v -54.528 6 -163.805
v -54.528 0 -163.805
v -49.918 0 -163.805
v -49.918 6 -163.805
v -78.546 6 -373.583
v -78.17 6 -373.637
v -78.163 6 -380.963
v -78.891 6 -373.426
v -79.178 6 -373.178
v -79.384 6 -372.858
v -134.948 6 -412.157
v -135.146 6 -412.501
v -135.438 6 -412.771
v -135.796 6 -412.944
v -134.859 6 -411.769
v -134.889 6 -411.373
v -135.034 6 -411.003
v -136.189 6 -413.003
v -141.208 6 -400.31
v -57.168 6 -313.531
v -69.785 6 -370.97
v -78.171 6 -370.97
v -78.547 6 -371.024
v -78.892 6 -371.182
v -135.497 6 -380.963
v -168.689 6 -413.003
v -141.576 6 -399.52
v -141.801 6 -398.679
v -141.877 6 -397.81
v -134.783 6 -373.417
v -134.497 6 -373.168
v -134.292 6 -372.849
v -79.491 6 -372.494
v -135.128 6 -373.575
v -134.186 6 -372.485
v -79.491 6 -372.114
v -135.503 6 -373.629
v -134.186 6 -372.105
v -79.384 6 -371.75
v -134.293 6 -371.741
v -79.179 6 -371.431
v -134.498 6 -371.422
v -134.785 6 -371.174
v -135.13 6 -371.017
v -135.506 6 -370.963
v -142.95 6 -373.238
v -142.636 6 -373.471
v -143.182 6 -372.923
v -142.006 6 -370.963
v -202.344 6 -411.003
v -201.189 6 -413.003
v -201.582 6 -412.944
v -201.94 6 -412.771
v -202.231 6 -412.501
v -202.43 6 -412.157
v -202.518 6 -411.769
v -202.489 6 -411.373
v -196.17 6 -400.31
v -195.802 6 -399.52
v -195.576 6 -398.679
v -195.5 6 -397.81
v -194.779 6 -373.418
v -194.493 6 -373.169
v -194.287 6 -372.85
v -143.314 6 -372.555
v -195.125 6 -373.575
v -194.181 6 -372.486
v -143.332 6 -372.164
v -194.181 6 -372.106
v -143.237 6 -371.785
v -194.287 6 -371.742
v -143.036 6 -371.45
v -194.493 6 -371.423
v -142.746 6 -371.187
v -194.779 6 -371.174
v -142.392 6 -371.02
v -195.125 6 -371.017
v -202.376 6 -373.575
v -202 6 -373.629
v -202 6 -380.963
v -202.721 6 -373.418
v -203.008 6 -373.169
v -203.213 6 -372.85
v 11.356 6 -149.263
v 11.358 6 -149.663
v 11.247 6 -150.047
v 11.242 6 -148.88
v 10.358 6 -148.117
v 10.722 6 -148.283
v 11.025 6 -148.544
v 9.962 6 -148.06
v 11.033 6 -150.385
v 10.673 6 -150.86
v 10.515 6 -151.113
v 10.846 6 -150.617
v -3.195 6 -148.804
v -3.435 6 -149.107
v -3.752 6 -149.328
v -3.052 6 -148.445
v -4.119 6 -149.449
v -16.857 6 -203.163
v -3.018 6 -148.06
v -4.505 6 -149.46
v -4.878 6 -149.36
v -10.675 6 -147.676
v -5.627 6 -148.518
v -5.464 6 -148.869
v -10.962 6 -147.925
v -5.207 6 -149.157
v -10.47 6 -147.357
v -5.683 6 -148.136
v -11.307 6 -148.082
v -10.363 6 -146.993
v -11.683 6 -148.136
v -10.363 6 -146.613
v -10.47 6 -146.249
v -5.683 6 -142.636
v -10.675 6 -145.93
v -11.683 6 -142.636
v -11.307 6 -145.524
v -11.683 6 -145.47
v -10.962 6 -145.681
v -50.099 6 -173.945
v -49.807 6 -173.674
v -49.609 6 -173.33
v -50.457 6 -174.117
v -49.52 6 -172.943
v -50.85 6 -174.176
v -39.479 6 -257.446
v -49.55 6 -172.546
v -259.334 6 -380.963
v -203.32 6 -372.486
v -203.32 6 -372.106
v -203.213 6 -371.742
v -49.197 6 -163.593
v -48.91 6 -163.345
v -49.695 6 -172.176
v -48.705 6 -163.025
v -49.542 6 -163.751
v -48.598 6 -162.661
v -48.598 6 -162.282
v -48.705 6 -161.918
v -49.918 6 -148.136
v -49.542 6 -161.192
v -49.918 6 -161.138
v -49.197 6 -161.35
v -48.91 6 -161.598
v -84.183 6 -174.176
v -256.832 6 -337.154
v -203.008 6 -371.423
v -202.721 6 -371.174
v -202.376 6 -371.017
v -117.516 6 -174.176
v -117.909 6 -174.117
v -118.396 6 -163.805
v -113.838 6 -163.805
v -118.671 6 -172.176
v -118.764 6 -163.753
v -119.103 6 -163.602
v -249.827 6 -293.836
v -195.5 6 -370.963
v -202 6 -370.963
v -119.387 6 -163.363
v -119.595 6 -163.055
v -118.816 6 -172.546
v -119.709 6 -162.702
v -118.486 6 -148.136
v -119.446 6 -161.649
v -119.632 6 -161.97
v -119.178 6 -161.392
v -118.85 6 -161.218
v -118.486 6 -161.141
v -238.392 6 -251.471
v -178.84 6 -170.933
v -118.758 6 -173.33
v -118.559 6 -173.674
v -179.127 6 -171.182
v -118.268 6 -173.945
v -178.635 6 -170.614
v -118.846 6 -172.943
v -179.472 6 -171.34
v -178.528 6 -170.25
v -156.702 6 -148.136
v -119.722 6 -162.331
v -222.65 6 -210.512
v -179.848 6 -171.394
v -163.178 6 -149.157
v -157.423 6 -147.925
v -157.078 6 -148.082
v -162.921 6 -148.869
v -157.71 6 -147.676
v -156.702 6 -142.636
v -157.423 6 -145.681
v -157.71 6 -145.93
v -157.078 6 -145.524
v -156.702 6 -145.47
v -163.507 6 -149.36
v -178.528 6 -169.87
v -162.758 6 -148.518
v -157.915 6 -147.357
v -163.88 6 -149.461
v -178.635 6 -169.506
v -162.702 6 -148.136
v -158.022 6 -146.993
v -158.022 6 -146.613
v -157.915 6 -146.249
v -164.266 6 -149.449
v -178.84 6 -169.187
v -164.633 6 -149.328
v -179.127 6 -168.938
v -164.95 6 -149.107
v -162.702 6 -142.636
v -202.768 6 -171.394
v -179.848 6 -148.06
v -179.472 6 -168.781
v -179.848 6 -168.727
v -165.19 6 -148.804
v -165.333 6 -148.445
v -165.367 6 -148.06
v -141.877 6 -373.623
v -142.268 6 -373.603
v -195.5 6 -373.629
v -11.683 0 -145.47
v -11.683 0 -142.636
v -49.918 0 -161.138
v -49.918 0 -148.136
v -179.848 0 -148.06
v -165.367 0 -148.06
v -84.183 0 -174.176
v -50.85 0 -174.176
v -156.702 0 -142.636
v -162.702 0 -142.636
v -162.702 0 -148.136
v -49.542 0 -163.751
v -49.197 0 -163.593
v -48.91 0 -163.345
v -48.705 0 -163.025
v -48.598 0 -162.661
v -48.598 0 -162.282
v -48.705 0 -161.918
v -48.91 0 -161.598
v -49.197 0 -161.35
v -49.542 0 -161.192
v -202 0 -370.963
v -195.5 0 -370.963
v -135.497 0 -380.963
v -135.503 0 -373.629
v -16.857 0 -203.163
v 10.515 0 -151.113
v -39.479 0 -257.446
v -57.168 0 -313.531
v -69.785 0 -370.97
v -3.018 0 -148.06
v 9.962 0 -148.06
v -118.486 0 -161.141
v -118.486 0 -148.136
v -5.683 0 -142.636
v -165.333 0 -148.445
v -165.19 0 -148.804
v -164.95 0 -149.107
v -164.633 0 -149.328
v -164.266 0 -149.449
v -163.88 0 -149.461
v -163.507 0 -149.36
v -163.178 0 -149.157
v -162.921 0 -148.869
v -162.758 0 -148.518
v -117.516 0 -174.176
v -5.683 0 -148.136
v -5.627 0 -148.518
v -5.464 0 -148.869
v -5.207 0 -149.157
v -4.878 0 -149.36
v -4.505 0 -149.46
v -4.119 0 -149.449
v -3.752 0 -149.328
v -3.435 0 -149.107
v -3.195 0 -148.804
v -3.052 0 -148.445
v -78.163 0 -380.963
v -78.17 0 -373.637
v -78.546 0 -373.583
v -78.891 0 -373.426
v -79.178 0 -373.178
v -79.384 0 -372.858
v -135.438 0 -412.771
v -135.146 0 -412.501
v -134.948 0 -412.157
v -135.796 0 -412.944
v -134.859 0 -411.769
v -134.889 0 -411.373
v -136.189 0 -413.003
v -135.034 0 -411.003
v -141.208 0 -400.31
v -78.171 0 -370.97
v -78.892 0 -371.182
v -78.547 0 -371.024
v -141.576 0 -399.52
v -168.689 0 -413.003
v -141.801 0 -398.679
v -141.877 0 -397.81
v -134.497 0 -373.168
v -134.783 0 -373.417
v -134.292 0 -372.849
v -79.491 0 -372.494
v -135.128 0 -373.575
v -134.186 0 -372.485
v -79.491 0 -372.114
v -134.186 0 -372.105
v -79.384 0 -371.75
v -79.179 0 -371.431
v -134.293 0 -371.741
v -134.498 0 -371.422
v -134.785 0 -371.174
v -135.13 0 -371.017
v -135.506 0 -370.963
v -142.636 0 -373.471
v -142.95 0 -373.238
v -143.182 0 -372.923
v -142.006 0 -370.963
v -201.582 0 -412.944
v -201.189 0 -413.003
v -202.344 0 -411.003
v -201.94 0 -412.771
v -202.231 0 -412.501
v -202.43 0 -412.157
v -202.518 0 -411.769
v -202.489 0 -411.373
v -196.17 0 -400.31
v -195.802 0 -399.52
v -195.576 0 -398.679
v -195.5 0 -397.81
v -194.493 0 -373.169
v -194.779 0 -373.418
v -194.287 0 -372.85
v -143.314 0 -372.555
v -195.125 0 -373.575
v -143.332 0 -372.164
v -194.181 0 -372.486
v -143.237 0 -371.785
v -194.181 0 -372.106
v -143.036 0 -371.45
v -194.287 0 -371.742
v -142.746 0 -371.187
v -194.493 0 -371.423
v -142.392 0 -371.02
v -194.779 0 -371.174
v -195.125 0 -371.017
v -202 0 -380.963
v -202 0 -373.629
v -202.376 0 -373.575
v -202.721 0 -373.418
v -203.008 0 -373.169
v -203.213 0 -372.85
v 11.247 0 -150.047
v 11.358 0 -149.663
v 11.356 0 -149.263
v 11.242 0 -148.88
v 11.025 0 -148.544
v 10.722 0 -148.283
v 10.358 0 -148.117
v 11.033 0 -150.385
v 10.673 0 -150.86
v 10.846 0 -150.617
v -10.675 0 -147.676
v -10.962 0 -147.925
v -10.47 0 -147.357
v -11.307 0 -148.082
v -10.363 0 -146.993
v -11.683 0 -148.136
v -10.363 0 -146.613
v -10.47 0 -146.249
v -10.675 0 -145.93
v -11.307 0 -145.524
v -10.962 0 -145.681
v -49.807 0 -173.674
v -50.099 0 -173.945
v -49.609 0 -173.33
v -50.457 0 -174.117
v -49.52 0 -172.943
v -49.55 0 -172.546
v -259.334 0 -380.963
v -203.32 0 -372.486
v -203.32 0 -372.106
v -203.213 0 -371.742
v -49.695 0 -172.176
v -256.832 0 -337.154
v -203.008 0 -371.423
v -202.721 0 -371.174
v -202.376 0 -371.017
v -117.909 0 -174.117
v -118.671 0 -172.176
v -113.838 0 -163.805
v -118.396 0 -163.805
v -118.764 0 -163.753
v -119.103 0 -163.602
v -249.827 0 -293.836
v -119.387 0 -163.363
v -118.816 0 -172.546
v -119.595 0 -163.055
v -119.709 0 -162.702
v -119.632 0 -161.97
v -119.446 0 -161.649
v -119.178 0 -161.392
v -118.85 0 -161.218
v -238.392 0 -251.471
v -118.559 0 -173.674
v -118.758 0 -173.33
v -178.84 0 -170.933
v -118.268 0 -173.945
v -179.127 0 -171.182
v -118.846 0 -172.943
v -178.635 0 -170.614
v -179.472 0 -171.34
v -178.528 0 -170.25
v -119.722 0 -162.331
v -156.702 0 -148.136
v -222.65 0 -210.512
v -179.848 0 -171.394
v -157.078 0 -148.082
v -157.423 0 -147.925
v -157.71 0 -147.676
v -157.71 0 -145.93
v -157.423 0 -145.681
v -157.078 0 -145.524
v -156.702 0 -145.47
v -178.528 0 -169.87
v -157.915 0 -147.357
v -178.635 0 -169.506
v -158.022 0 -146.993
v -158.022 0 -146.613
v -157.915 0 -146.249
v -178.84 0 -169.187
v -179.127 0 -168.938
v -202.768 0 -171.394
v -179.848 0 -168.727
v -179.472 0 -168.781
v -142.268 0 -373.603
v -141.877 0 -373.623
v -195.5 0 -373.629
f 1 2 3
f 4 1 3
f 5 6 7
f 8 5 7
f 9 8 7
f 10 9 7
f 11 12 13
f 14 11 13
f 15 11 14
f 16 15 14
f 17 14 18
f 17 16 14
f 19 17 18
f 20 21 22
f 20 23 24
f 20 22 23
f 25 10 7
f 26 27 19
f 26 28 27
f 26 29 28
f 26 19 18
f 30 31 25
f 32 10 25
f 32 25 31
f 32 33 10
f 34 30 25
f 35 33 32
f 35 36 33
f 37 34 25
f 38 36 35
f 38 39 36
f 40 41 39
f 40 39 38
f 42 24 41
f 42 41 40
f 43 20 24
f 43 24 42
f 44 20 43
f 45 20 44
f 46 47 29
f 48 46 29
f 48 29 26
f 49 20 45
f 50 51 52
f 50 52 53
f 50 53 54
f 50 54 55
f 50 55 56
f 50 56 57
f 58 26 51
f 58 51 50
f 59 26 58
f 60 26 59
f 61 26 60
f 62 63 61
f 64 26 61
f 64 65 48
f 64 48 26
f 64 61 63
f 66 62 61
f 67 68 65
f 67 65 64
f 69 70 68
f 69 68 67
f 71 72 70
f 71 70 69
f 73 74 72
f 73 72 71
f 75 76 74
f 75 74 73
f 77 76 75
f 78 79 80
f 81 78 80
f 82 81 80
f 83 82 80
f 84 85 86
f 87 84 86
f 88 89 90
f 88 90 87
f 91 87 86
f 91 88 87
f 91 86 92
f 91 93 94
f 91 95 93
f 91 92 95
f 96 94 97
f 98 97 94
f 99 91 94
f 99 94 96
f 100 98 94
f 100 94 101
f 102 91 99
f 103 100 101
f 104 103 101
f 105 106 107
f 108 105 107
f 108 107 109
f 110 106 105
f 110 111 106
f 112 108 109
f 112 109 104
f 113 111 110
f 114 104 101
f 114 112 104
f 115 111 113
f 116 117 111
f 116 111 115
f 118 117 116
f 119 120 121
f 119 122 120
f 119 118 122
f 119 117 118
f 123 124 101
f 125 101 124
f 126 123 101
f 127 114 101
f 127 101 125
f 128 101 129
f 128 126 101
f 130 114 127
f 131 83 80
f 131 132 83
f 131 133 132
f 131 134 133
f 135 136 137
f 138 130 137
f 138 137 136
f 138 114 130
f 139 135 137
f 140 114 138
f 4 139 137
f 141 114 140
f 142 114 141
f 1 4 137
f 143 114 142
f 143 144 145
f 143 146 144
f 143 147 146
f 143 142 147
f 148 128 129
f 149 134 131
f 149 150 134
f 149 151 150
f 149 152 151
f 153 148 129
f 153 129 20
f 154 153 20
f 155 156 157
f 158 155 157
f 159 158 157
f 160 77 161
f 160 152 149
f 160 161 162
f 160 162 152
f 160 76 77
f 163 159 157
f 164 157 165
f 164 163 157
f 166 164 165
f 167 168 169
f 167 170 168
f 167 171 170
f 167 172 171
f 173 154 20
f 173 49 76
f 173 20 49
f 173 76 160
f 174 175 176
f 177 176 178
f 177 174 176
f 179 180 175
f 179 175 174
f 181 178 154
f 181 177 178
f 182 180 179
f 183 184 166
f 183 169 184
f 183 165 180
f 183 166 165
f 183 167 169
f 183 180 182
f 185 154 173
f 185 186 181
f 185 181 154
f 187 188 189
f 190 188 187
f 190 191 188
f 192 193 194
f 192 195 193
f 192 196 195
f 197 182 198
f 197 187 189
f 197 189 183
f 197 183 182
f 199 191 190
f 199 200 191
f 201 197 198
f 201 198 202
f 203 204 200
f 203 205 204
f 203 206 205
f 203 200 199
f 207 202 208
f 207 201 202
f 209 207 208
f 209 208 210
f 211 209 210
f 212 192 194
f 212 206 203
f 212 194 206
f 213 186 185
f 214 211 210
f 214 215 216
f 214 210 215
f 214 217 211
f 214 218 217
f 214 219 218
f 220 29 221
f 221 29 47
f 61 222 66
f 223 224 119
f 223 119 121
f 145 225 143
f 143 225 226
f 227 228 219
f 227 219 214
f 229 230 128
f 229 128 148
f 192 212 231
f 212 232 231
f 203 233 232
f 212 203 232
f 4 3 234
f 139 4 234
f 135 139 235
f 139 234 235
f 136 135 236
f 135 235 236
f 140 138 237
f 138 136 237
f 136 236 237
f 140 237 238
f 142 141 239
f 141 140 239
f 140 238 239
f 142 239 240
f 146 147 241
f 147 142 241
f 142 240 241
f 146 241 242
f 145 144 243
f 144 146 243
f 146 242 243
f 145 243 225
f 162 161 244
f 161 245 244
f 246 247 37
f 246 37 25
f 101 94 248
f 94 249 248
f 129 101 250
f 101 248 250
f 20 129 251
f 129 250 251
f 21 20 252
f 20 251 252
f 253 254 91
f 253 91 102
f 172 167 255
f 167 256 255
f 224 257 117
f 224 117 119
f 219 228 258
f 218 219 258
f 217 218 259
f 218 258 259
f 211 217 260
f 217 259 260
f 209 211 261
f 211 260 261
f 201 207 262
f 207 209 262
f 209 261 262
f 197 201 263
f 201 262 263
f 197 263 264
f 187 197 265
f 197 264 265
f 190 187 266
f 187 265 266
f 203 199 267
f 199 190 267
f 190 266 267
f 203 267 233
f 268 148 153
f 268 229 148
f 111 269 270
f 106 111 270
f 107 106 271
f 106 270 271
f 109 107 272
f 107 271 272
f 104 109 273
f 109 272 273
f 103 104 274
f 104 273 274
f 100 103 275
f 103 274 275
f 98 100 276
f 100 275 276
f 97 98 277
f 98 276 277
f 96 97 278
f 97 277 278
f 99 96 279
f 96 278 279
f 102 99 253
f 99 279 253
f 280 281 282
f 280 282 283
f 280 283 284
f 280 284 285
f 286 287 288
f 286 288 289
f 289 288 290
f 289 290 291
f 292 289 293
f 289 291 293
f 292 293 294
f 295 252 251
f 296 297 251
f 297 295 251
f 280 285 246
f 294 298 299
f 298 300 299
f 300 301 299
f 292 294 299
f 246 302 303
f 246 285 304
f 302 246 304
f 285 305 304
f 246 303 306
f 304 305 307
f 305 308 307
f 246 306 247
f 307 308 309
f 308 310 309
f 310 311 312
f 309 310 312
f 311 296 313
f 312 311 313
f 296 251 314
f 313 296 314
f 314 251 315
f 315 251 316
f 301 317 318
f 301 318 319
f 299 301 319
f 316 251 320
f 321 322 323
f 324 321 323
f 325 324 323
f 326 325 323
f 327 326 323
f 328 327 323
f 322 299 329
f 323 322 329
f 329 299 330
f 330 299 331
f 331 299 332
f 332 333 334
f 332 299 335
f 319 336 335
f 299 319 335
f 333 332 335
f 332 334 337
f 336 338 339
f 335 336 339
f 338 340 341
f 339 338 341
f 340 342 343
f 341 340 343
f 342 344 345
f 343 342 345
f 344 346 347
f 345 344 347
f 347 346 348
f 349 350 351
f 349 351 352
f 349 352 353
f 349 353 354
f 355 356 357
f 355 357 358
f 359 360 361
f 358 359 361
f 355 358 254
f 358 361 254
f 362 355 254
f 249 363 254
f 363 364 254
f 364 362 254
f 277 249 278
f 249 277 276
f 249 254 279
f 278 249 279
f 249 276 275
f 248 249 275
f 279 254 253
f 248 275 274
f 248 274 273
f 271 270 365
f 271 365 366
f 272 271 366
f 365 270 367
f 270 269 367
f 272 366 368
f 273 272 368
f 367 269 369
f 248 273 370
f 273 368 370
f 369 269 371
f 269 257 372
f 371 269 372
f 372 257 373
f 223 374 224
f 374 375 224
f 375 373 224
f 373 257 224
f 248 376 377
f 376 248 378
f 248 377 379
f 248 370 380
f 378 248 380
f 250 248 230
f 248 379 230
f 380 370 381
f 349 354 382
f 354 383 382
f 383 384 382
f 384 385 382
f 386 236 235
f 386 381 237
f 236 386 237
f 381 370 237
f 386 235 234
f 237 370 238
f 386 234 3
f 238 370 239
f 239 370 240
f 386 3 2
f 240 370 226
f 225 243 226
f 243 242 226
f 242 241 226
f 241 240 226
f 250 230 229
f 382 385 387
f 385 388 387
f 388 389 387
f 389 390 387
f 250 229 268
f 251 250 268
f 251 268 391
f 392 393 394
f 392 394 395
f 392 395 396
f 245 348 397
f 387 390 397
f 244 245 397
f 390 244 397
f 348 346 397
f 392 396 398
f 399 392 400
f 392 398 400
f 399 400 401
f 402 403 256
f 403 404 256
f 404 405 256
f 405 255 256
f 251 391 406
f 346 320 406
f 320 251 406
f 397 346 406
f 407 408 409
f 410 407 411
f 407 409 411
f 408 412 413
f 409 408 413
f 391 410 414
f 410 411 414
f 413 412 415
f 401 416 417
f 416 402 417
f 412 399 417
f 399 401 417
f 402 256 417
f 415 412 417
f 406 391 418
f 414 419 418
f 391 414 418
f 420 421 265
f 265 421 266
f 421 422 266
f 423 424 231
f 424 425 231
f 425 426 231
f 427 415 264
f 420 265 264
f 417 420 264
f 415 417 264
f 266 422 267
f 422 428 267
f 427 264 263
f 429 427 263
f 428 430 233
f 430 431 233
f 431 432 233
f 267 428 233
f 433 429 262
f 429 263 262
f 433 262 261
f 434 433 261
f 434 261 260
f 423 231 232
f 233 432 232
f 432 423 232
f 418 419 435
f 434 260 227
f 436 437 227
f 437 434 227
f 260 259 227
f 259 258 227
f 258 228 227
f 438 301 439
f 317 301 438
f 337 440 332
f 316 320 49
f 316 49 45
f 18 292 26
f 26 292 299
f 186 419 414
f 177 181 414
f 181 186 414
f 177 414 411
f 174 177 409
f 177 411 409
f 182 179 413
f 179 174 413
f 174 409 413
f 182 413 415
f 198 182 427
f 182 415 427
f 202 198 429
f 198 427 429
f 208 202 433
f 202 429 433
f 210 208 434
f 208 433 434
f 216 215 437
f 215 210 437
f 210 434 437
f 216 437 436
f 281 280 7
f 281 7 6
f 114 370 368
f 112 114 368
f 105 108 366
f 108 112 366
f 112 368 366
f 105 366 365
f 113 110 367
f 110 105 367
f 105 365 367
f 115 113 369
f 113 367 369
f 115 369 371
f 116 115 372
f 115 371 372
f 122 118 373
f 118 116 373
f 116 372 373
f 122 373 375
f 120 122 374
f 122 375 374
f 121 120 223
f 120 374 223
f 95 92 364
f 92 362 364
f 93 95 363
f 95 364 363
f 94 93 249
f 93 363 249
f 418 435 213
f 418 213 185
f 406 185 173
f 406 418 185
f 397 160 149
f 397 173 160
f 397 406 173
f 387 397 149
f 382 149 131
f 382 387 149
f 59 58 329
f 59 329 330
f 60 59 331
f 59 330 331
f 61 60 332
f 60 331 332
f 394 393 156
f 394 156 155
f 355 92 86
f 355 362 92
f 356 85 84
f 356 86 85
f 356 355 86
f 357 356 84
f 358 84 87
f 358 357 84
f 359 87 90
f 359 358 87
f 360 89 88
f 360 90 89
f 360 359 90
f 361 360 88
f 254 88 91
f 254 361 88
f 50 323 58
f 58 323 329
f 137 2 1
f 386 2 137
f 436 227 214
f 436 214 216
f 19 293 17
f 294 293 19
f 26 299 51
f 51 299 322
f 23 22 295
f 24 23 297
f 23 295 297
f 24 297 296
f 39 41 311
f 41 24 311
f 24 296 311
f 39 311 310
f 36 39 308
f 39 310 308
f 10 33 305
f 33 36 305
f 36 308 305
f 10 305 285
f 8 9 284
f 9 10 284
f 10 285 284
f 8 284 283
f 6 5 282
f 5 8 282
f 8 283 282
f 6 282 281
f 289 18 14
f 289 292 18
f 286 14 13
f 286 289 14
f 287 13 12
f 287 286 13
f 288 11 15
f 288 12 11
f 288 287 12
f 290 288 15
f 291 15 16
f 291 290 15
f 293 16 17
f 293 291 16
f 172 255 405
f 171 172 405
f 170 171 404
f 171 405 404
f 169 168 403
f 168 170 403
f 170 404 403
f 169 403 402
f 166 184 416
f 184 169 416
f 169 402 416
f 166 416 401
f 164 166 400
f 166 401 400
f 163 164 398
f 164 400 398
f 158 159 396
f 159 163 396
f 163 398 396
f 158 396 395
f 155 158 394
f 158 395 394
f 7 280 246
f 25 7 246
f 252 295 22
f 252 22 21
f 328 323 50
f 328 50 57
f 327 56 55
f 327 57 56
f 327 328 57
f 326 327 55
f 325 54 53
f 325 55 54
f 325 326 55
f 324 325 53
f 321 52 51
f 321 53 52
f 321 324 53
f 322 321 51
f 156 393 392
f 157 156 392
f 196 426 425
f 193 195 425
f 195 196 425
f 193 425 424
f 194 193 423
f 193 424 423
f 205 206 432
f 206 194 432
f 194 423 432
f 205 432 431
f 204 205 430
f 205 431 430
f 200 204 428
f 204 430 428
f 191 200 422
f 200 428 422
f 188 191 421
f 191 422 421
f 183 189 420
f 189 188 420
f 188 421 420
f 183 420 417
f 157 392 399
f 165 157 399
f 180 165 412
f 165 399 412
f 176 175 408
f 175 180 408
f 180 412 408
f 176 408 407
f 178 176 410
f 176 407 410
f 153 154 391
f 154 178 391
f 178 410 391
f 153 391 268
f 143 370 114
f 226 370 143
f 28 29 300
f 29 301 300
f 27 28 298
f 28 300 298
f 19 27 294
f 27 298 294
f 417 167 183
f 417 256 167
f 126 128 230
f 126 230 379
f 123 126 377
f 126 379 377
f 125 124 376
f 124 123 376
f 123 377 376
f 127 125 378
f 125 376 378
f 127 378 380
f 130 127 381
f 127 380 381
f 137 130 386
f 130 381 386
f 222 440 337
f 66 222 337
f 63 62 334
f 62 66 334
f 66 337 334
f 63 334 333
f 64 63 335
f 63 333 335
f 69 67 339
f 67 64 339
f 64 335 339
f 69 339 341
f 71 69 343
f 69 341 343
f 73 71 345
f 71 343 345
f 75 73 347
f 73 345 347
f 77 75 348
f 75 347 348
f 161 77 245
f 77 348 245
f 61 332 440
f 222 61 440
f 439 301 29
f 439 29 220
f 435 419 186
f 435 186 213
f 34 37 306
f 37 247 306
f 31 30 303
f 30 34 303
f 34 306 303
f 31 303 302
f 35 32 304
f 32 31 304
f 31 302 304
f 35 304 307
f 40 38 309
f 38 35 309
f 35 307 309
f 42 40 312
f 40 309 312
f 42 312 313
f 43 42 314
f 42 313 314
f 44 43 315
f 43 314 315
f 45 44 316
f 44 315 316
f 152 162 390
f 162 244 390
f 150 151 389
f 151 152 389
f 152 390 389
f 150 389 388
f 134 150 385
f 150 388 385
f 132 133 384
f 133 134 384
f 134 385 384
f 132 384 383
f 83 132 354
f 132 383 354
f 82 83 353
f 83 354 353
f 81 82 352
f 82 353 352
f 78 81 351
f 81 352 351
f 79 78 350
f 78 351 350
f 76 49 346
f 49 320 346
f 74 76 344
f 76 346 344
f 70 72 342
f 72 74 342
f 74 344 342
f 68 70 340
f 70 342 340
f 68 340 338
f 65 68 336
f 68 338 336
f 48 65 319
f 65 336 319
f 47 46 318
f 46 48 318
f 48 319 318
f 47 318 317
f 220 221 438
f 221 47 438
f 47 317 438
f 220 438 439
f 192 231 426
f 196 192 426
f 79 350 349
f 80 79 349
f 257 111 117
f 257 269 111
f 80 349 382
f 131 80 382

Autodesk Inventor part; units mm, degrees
ref_plane "YZ Plane" through (0, 0, 0) normal (1, 0, 0) x (0, 1, 0)
ref_plane "XZ Plane" through (0, 0, 0) normal (0, 1, 0) x (-1, 0, 0)
ref_plane "XY Plane" through (0, 0, 0) normal (0, 0, 1) x (1, 0, 0)
sketch "Sketch1" plane through (0, 0, 0) normal (0, 1, 0) x (-1, 0, 0)
  line L0 (54.5284, -163.8048) -> (49.6951, -172.1764)
  arc A0 (49.6951, -172.1764) -> (50.8498, -174.1764) centre (50.8498, -172.843) ccw
  line L1 (50.8498, -174.1764) -> (117.5164, -174.1764)
  line L2 (113.8378, -163.8048) -> (118.6711, -172.1764)
  arc A1 (117.5164, -174.1764) -> (118.6711, -172.1764) centre (117.5164, -172.843) ccw
  arc A2 (259.3338, -380.9628) -> (202.7682, -171.3935) centre (-165.66, -383.2559) ccw
  line L3 (113.8378, -163.8048) -> (118.3961, -163.8048)
  arc A3 (118.3961, -163.8048) -> (118.4865, -161.1412) centre (118.3961, -162.4715) ccw
  line L4 (54.5284, -163.8048) -> (49.9178, -163.8048)
  arc A4 (49.9178, -161.1381) -> (49.9178, -163.8048) centre (49.9178, -162.4715) ccw
  line L5 (5.6828, -148.1362) -> (5.6828, -142.6365)
  line L6 (5.6828, -142.6365) -> (11.6828, -142.6364)
  line L7 (11.6828, -142.6364) -> (11.6828, -145.4697)
  arc A5 (11.6828, -145.4697) -> (11.6828, -148.1364) centre (11.6828, -146.803) ccw
  arc A6 (3.0183, -148.0602) -> (5.6828, -148.1362) centre (4.3494, -148.1362) ccw
  line L8 (162.7021, -148.1362) -> (162.7021, -142.6363)
  line L9 (162.7021, -142.6363) -> (156.7021, -142.6363)
  line L10 (156.7021, -142.6363) -> (156.7021, -145.4697)
  arc A7 (156.7021, -148.1364) -> (156.7021, -145.4697) centre (156.7021, -146.803) ccw
  arc A8 (162.7021, -148.1362) -> (165.3666, -148.0602) centre (164.0355, -148.1362) ccw
  line L11 (165.3666, -148.0602) -> (179.8476, -148.0602)
  line L12 (179.8476, -148.0602) -> (179.8476, -168.7268)
  arc A9 (179.8476, -168.7268) -> (179.8476, -171.3935) centre (179.8476, -170.0602) ccw
  line L13 (179.8476, -171.3935) -> (202.7682, -171.3935)
  line L14 (78.171, -370.9703) -> (69.785, -370.9703)
  line L15 (168.6888, -389.73) -> (168.6888, -432.7538)
  arc A10 (201.1888, -413.0028) -> (202.3435, -411.0028) centre (201.1888, -411.6694) ccw
  line L16 (195.5003, -397.8103) -> (195.5003, -373.6294)
  arc A11 (195.5003, -370.9628) -> (195.5003, -373.6294) centre (195.5003, -372.2961) ccw
  line L17 (195.5003, -370.9628) -> (202.0003, -370.9628)
  arc A12 (202.0003, -373.6294) -> (202.0003, -370.9628) centre (202.0003, -372.2961) ccw
  line L18 (202.0003, -373.6294) -> (202.0003, -380.9628)
  line L19 (78.1632, -380.9628) -> (135.4967, -380.9628)
  line L20 (202.0003, -380.9628) -> (259.3338, -380.9628)
  arc A13 (135.0341, -411.0028) -> (136.1888, -413.0028) centre (136.1888, -411.6694) ccw
  arc A14 (141.8773, -373.6233) -> (142.0056, -370.9628) centre (142.0056, -372.2961) ccw
  line L21 (142.0056, -370.9628) -> (135.5056, -370.9628)
  arc A15 (135.5056, -370.9628) -> (135.5032, -373.6294) centre (135.5056, -372.2961) ccw
  line L22 (135.5032, -373.6294) -> (135.4967, -380.9628)
  line L23 (49.9178, -161.1381) -> (49.9178, -148.1364)
  line L24 (118.4865, -148.1364) -> (118.4865, -161.1412)
  line L25 (202.3435, -411.0028) -> (196.1702, -400.3103)
  arc A16 (195.5003, -397.8103) -> (196.1702, -400.3103) centre (200.5003, -397.8103) ccw
  line L26 (141.8773, -397.8103) -> (141.8773, -373.6233)
  line L27 (135.0341, -411.0028) -> (141.2075, -400.3103)
  arc A17 (141.2075, -400.3103) -> (141.8773, -397.8103) centre (136.8773, -397.8103) ccw
  arc A18 (78.1697, -373.637) -> (78.171, -370.9703) centre (78.171, -372.3036) ccw
  line L28 (78.1632, -380.9628) -> (78.1697, -373.637)
  line L29 (136.1888, -413.0028) -> (201.1888, -413.0028)
  arc A19 (-9.9624, -148.0602) -> (-11.0329, -150.3848) centre (-9.9624, -149.469) ccw
  arc A20 (69.785, -370.9703) -> (-10.5152, -151.1127) centre (-579.254, -483.4304) ccw
  arc A21 (-10.5152, -151.1127) -> (-11.0329, -150.3848) centre (-14.8322, -153.6352) ccw
  line L30 (118.4865, -148.1364) -> (156.7021, -148.1364)
  line L31 (84.1831, -174.1764) -> (84.1831, -204.8832)
  line L32 (-9.9624, -148.0602) -> (3.0183, -148.0602)
  line L33 (11.6828, -148.1364) -> (49.9178, -148.1364)
  point P0 (2.7021, -144.053)
  point P1 (1.3688, -146.803)
  point P2 (-3.2979, -145.3864)
  point P3 (-7.9624, -148.0602)
  point P4 (116.117, -163.8048)
  dimension "d102" = 2.6667
  dimension "d107" = 2.6667
  dimension "d108" = 6.5
  dimension "d109" = 2.6667
  dimension "d111" = 57.3335
  dimension "d127" = 9.6667
  dimension "d128" = 9.6667
  dimension "d129" = 1.3333
  dimension "d131" = 62.3312
  dimension "d132" = 1.3333
  dimension "d133" = 14.481
  dimension "d134" = 1.3333
  dimension "d135" = 6
  dimension "d141" = 7.3333
  dimension "d142" = 5
  dimension "d145" = 1.3333
  dimension "d149" = 1.3333
  dimension "d151" = 658.71
  dimension "d152" = 5
  dimension "d153" = 68.5687
  dimension "d154" = 66.6667
  dimension "d155" = 1.3333
  dimension "d156" = 1.3333
  dimension "d158" = 1.3333
  dimension "d160" = 10.3716
  dimension "d161" = 10.3716
  dimension "d162" = 38.2156
  dimension "d163" = 38.235
  dimension "d164" = 15.6684
  dimension "d165" = 15.6684
  dimension "d166" = 23.3333
  dimension "d167" = 84.5058
  dimension "d169" = 264.8664
  dimension "d170" = 145.0381
  dimension "d171" = 6
  dimension "d172" = 5.4997
  dimension "d173" = 1.3333
  dimension "d174" = 2.8333
  dimension "d175" = 145.0006
extrude "Extrusion3" add sketch "Sketch1" along normal blind 6
properties part number "Support B"
